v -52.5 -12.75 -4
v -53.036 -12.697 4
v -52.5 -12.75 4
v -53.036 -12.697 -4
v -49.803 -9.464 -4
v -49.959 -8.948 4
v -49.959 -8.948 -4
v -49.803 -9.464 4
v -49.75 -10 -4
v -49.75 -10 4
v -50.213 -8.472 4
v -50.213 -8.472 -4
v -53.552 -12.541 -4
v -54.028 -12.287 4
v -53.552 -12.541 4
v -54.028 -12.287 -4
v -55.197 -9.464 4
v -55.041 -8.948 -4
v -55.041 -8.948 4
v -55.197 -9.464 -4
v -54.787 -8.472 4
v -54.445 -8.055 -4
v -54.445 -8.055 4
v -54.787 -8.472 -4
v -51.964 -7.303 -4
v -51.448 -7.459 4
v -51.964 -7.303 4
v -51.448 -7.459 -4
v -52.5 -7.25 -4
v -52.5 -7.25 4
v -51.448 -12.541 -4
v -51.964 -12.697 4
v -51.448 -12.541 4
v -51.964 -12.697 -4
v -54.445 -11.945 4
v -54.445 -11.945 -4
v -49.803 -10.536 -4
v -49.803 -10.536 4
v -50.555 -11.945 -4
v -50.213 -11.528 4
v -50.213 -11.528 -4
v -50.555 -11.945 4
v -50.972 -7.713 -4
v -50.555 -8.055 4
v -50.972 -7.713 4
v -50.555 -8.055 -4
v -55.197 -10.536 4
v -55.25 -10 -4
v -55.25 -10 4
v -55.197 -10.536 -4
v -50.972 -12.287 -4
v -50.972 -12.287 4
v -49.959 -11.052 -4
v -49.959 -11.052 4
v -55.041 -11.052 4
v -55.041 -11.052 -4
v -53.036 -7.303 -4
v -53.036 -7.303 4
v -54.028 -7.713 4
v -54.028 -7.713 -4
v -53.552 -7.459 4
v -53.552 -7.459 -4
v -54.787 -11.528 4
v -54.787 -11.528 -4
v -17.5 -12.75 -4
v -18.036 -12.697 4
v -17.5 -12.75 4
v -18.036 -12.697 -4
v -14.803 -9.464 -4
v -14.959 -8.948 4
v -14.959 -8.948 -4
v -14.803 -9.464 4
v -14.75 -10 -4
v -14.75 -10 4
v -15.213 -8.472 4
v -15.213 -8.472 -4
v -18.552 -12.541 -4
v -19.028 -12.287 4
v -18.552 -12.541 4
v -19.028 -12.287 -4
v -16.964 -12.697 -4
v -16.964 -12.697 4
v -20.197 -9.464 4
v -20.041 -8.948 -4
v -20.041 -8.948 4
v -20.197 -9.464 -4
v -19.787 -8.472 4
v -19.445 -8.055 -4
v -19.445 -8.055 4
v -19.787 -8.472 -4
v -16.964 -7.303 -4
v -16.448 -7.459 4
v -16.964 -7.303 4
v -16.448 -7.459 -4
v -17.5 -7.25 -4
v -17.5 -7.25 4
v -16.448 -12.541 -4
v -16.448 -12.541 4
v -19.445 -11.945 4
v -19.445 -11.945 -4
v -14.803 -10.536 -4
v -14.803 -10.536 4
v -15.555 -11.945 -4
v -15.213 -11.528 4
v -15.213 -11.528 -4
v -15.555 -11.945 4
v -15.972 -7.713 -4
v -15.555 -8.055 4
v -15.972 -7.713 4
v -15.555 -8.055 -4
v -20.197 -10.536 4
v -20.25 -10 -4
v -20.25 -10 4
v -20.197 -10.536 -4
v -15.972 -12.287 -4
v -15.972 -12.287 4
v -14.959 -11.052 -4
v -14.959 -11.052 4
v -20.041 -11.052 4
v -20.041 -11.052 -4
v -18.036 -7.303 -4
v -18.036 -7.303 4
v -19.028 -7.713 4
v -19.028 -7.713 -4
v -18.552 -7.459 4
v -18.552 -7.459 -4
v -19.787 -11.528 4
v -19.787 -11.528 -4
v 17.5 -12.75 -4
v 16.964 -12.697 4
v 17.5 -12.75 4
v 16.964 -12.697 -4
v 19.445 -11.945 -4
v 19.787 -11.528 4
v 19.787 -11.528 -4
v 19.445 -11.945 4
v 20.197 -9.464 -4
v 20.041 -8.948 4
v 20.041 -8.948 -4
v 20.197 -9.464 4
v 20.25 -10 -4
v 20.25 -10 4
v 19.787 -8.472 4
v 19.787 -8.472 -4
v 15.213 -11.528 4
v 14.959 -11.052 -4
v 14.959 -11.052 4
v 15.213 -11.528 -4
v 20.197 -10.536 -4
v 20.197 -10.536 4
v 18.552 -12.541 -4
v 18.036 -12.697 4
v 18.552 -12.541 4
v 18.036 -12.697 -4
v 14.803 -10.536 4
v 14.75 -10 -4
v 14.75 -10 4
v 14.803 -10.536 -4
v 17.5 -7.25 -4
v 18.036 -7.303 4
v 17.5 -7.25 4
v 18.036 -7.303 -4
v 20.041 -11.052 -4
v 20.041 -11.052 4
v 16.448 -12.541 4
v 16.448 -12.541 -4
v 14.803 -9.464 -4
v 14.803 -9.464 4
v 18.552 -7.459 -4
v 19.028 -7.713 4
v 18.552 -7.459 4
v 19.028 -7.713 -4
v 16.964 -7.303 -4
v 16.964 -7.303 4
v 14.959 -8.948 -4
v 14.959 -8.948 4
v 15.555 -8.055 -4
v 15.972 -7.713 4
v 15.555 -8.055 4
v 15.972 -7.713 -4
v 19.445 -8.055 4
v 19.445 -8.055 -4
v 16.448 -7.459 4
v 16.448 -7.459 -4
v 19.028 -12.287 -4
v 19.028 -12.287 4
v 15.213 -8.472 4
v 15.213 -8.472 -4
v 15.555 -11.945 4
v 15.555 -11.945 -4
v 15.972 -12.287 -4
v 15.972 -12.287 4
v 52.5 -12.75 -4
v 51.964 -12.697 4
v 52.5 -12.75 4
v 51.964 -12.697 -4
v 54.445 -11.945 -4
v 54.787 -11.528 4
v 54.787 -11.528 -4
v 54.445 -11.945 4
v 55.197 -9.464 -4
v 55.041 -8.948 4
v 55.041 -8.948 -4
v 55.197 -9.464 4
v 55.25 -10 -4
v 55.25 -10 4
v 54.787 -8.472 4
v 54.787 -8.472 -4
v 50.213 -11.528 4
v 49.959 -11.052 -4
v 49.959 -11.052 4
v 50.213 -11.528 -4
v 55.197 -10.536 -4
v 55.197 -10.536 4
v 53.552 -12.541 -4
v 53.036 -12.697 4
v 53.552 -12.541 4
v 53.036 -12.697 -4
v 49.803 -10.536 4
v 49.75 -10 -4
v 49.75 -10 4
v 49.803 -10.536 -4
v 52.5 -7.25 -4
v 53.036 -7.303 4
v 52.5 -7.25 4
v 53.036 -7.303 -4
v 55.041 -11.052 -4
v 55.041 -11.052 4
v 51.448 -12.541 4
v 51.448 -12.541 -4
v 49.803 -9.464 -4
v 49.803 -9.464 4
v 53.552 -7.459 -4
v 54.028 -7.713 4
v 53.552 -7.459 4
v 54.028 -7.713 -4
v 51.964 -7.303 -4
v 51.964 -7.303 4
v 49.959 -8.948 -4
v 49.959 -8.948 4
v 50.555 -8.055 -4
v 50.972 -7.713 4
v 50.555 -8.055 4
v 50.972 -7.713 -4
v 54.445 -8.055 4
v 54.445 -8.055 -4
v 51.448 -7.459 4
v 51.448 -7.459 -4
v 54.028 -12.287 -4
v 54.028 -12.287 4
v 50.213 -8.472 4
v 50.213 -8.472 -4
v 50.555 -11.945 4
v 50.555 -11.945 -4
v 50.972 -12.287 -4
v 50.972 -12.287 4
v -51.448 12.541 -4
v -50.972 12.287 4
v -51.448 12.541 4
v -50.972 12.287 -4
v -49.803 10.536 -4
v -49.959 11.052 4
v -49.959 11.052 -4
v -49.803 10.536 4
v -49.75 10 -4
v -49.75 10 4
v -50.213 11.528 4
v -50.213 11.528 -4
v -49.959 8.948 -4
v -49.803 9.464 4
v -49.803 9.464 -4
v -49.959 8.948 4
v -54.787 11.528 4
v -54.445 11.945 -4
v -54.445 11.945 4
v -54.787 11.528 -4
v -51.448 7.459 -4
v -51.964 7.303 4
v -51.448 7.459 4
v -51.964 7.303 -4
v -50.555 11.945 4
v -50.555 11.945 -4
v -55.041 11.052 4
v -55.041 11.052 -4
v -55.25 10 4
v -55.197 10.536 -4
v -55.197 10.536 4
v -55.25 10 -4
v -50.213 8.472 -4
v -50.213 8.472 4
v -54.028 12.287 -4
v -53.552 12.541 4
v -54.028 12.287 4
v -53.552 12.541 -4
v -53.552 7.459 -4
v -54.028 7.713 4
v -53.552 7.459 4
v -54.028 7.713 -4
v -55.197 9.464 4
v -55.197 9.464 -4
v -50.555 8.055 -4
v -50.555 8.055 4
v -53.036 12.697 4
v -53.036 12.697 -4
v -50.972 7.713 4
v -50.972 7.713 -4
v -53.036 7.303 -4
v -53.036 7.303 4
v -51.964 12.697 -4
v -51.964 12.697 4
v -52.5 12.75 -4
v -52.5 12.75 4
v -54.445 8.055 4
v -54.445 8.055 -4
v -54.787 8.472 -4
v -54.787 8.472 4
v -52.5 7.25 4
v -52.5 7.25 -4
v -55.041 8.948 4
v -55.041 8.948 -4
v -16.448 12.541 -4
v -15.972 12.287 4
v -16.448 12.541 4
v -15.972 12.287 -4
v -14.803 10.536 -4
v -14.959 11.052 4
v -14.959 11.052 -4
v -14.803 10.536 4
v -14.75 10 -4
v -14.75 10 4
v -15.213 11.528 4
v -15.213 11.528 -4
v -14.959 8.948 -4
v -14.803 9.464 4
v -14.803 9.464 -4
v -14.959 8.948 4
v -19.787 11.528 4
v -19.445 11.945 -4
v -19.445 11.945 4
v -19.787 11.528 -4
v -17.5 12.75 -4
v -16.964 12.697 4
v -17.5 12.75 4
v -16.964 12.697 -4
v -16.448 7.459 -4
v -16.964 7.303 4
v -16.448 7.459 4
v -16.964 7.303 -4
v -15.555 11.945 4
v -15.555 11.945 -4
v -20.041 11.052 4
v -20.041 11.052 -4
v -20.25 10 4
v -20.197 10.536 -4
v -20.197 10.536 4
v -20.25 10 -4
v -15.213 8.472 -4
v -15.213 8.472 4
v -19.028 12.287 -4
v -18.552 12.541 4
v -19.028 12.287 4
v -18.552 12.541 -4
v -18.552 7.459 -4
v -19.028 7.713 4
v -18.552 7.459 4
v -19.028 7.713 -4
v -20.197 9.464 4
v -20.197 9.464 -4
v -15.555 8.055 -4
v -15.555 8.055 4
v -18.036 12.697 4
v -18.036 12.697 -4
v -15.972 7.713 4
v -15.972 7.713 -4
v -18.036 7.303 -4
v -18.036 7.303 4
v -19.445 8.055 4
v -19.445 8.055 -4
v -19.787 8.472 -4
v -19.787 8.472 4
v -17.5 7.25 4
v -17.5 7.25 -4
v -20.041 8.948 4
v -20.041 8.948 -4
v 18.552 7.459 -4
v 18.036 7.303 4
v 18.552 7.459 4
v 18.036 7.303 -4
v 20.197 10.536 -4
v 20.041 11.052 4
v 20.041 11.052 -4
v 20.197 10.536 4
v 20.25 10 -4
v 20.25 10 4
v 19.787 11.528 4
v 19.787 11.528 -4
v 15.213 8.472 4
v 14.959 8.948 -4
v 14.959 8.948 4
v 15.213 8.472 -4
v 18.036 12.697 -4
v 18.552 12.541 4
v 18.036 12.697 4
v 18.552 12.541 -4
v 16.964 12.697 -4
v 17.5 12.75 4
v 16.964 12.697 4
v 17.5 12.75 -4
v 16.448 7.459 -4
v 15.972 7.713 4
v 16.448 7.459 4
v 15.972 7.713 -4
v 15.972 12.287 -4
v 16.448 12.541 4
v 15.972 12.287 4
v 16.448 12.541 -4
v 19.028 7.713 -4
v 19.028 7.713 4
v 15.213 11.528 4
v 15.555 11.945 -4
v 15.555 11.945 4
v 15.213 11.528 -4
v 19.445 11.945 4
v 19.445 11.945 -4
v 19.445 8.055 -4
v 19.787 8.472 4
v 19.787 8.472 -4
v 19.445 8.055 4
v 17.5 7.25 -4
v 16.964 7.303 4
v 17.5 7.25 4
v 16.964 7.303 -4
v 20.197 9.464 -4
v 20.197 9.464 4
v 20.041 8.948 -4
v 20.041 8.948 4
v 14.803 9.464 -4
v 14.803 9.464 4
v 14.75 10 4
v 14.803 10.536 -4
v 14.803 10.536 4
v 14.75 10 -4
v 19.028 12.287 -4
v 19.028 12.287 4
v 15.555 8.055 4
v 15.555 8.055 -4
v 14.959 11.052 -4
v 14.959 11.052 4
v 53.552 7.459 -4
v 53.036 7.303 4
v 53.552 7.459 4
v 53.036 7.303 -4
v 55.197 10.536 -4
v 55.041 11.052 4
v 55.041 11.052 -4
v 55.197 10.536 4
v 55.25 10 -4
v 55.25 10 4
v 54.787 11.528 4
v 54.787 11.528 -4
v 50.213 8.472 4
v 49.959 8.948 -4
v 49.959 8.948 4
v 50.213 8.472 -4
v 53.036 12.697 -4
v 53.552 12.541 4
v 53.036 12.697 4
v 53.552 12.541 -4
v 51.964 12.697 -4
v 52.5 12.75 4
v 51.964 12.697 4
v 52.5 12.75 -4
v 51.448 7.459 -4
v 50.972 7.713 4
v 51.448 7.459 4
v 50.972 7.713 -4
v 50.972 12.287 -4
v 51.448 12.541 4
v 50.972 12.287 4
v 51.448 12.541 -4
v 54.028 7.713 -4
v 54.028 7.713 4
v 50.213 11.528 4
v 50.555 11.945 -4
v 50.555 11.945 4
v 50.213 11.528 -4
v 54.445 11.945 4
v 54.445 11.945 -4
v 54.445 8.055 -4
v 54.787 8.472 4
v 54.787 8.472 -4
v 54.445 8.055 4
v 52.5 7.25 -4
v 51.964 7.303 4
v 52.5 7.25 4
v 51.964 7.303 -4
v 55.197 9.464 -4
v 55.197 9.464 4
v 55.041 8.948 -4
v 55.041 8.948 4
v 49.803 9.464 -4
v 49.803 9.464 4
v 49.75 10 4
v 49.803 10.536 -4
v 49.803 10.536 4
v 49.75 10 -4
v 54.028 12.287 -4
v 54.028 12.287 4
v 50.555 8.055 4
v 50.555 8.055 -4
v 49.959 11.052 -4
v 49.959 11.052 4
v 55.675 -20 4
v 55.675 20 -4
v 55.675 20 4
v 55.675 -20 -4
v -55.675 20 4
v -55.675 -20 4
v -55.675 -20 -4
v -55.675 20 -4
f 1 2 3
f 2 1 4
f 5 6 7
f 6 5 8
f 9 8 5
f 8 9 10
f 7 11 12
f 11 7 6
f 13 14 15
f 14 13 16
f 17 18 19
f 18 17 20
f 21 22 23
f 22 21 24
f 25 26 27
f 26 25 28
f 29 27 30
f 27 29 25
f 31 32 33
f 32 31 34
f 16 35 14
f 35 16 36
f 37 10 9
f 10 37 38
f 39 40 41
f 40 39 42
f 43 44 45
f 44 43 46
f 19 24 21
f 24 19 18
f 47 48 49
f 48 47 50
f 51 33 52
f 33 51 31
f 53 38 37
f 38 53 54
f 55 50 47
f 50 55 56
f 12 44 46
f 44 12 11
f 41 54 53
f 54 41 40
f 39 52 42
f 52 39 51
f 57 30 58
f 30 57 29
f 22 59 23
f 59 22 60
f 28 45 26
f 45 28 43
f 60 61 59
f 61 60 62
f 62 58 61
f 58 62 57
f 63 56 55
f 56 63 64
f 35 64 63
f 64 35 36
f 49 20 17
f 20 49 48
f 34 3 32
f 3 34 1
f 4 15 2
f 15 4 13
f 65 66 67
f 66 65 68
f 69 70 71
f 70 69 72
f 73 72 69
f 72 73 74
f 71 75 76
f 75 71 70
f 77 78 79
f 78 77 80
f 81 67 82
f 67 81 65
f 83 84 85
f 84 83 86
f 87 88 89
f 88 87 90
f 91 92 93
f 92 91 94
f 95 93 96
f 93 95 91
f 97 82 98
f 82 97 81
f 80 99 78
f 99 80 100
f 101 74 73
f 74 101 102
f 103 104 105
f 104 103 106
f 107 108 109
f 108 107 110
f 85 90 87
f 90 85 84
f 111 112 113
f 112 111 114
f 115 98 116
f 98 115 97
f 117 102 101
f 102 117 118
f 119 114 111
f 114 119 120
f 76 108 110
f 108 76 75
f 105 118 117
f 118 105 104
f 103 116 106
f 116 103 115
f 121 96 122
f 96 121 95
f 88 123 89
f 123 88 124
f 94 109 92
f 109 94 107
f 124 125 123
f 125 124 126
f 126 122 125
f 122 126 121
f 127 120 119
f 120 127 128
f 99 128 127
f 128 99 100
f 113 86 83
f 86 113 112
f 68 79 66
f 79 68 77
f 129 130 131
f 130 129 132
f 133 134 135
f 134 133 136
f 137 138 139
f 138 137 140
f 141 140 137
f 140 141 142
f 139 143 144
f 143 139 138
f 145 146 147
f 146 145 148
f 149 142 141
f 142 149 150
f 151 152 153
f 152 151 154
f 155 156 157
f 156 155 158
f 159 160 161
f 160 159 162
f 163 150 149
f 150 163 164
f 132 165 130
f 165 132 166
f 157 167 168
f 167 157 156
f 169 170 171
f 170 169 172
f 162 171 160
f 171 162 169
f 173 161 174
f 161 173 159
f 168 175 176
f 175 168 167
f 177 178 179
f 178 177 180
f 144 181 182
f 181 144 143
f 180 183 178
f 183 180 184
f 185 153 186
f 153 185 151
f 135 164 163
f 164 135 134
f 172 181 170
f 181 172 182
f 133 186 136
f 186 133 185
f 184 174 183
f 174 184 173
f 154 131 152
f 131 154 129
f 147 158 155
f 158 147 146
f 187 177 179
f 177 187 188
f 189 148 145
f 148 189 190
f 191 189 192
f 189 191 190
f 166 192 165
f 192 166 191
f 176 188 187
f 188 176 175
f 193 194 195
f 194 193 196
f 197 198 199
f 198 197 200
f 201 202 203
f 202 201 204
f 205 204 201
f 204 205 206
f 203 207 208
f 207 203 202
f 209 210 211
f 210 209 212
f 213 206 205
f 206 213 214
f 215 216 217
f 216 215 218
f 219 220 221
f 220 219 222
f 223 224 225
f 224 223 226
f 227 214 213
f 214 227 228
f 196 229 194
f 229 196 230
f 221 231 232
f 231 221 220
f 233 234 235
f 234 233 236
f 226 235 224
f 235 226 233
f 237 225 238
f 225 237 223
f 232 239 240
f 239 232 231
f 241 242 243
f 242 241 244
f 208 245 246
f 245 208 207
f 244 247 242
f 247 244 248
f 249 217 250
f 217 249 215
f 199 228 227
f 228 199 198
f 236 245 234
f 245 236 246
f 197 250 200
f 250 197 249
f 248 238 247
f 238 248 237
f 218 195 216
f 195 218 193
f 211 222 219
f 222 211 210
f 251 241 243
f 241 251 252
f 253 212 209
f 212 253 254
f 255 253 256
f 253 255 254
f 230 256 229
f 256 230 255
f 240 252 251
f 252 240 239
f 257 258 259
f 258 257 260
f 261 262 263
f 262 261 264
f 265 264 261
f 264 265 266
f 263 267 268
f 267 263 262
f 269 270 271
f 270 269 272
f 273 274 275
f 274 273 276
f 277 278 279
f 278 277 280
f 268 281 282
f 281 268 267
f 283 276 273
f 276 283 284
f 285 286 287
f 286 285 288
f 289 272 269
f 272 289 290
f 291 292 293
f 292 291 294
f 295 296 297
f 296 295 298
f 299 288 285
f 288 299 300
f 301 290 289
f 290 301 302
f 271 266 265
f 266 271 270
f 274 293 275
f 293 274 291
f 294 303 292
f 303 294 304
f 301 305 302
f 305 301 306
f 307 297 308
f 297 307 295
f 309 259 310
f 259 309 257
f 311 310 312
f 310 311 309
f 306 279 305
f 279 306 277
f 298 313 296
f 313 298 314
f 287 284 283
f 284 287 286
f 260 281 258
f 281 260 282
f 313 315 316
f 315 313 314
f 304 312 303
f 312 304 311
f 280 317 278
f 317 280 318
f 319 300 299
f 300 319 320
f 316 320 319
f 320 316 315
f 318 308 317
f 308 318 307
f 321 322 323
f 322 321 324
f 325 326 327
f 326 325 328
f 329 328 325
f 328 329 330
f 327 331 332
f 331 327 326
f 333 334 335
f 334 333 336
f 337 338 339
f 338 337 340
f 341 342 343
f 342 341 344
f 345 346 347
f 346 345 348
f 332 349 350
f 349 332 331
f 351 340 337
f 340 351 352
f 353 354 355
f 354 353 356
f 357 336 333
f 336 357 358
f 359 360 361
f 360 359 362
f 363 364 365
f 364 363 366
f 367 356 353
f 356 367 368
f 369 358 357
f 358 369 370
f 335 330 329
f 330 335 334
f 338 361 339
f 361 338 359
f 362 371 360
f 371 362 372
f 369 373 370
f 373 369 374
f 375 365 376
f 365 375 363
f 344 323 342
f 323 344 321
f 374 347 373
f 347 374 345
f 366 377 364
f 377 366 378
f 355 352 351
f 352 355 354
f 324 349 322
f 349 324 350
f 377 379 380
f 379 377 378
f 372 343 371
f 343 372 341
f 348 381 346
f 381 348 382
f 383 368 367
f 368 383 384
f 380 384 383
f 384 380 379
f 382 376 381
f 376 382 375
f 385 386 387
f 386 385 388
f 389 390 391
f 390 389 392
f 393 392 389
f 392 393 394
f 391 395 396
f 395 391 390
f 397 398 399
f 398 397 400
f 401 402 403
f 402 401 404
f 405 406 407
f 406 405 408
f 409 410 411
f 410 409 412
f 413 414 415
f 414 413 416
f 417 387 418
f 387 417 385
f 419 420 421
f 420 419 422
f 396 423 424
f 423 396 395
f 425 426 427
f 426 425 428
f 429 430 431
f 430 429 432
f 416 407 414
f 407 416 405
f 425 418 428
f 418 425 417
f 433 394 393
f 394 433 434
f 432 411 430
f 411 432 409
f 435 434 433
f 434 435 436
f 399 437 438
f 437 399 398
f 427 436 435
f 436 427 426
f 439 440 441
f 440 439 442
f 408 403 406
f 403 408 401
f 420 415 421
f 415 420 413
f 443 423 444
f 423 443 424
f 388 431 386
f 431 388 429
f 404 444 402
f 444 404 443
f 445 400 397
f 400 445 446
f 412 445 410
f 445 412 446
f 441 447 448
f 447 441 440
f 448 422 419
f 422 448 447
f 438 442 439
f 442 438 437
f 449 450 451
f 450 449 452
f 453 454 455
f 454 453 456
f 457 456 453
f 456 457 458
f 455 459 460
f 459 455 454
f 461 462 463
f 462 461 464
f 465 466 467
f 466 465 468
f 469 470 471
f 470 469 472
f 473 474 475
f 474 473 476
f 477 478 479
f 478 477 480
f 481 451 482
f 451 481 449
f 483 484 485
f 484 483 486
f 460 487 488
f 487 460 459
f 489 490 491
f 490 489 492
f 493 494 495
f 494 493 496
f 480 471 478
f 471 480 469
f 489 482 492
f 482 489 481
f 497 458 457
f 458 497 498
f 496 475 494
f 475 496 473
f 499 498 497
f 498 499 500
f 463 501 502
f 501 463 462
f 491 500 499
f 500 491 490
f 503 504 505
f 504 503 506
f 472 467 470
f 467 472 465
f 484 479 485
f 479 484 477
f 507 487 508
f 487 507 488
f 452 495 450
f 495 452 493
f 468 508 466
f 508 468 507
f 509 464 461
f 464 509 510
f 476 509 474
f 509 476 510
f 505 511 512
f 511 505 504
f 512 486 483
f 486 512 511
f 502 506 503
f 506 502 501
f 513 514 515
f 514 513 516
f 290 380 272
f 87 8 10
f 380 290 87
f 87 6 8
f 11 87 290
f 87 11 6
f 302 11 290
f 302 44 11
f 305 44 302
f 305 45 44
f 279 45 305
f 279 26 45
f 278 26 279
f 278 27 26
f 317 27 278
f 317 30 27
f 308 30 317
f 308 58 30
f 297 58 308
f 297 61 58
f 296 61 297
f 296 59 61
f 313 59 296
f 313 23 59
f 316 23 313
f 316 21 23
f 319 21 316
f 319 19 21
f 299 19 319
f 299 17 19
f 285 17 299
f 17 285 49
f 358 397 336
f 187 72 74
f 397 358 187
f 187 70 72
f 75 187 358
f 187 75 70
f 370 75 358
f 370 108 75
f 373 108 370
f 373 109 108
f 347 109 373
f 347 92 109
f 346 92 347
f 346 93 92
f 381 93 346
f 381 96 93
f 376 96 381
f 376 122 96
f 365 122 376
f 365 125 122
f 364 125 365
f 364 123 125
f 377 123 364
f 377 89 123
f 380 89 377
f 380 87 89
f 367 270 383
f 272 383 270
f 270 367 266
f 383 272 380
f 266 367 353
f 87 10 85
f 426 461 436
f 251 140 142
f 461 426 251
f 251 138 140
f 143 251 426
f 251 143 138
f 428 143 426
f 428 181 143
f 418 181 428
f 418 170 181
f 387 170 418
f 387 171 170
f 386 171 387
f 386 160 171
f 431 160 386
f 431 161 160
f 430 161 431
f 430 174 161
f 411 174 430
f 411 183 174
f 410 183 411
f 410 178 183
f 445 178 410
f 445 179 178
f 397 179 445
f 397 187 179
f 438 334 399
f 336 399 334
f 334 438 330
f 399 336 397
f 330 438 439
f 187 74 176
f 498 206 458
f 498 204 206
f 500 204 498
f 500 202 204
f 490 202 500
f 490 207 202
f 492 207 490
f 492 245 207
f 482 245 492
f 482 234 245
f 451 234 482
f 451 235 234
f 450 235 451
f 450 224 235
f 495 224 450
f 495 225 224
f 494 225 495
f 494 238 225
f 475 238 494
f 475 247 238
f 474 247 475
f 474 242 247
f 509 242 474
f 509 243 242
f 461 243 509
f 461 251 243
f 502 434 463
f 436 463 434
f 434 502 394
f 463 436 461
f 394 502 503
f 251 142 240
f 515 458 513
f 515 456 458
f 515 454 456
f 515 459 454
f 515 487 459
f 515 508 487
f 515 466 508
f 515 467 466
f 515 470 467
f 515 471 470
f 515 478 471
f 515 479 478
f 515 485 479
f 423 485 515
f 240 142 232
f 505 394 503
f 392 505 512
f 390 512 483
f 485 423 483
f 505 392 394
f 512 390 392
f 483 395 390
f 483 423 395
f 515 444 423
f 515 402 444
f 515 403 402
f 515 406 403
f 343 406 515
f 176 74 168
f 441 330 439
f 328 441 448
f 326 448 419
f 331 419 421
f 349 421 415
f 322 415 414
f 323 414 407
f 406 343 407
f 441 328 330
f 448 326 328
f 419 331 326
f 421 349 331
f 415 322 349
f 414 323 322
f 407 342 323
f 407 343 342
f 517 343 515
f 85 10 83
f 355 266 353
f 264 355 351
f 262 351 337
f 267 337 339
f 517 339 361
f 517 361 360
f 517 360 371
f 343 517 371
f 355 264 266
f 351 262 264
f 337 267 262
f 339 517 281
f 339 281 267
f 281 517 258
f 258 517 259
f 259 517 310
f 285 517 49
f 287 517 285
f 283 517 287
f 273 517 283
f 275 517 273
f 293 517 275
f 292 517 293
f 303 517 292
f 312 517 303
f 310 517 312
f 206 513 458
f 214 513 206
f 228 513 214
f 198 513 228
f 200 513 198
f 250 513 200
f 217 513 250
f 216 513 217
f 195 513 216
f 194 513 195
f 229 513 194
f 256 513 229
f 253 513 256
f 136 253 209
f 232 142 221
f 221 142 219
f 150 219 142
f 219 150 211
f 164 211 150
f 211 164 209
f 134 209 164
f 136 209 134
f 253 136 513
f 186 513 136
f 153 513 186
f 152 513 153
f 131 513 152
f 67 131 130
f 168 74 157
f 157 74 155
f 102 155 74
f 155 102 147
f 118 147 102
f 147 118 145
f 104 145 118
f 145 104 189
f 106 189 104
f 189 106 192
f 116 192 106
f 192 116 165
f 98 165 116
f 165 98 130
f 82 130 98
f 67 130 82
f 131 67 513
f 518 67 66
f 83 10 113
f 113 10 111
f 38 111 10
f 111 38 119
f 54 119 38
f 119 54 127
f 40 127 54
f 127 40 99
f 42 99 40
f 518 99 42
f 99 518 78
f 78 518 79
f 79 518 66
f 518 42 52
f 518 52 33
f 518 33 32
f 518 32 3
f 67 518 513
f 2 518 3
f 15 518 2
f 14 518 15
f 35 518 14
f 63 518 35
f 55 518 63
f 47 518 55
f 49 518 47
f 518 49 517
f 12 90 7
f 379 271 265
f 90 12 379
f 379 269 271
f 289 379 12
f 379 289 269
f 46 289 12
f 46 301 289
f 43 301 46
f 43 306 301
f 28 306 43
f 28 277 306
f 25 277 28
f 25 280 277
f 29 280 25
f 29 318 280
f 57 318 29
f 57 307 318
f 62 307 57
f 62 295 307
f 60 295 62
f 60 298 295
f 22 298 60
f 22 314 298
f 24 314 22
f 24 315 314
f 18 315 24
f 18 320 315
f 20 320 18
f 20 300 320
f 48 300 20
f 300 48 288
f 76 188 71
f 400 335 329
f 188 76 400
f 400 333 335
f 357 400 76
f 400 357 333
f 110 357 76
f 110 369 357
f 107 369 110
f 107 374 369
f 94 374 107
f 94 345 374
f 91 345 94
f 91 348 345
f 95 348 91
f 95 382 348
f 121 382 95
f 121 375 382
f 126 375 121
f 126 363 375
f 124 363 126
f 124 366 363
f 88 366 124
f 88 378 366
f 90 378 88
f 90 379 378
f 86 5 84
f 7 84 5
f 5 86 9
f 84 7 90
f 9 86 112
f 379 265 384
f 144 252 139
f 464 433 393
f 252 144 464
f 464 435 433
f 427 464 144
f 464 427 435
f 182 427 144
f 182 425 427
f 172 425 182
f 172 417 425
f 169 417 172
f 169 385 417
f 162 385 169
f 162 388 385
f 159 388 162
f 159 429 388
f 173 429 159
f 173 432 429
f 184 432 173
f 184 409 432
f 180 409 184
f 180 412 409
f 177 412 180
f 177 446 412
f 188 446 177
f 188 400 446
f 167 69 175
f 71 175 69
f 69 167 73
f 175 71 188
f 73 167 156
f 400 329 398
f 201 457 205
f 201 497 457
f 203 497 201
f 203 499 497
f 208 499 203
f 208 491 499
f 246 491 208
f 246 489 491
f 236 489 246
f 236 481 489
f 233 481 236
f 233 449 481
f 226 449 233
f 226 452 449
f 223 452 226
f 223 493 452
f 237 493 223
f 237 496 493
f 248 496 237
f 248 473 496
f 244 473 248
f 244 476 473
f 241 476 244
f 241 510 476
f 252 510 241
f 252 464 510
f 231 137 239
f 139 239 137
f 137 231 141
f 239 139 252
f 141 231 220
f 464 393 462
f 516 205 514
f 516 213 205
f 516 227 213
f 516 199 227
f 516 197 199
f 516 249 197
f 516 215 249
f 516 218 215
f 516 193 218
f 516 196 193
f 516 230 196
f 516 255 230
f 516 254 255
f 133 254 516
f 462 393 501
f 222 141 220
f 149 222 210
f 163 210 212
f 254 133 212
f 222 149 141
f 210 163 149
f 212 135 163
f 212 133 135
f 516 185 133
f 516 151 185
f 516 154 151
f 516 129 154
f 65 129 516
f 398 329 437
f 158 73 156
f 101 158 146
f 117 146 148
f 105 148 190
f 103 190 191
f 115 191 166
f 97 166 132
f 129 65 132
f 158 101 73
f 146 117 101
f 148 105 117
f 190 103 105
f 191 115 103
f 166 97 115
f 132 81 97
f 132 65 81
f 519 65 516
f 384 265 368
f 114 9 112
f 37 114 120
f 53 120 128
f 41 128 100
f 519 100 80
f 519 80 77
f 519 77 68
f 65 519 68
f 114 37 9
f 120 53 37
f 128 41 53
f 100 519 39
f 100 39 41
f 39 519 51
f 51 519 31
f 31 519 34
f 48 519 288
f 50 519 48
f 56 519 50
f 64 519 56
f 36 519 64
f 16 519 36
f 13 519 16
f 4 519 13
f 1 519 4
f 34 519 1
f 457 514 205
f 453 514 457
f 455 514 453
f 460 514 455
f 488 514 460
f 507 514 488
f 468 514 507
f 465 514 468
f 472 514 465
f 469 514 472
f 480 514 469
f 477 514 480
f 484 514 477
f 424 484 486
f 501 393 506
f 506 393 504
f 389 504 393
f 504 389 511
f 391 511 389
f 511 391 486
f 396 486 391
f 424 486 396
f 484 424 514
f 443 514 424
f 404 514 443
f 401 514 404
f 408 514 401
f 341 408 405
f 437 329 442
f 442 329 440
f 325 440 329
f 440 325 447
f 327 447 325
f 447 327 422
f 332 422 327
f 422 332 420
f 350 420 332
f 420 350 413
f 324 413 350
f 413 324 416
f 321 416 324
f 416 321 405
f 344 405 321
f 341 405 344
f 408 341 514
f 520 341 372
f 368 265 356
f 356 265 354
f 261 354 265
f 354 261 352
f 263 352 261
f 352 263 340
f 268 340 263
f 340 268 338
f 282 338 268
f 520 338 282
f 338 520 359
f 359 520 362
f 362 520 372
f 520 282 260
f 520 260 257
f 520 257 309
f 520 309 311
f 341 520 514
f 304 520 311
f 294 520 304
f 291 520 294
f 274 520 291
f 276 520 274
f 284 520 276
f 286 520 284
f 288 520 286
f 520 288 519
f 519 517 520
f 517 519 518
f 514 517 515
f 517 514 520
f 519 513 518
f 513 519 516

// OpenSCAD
$fn = 32;

// ----------------------------------------------------------------------
// Hole bar, 4 x Ø5.5
// tworows layout, 3.175 mm edge offset
// ----------------------------------------------------------------------

// --- parameters (mm) ---
bar_w = 40;       // bar width (Y)
bar_t = 8;        // bar thickness (Z)
holes = 4;        // holes per row
hole_d = 5.5;     // hole diameter
edge = 3.175;     // offset from the bar end to the first hole
pitch = 35;       // pitch between neighbouring holes
row_offset = 20;  // distance between the two rows

// --- derived feature positions (mm) ---
span = (holes - 1) * pitch;   // = 105   distance between the end holes
bar_l = span + 2 * edge;      // = 111.35   overall bar length
start_x = -bar_l / 2 + edge;  // = -52.5   X of the first hole
feature_centers = [
  [start_x + 0 * pitch, -row_offset / 2],
  [start_x + 1 * pitch, -row_offset / 2],
  [start_x + 2 * pitch, -row_offset / 2],
  [start_x + 3 * pitch, -row_offset / 2]
];   // hole centres of the first row
row2_centers = [
  [start_x + 0 * pitch, row_offset / 2],
  [start_x + 1 * pitch, row_offset / 2],
  [start_x + 2 * pitch, row_offset / 2],
  [start_x + 3 * pitch, row_offset / 2]
];   // hole centres of the second row

// bar with two rows of holes, both read from their own centre arrays
difference() {
  translate([-bar_l / 2, -bar_w / 2, -bar_t / 2]) cube([bar_l, bar_w, bar_t]);
  for (centre = feature_centers)
    translate([centre[0], centre[1], 0])
      cylinder(d = hole_d, h = bar_t + 2, center = true);
  for (centre = row2_centers)
    translate([centre[0], centre[1], 0])
      cylinder(d = hole_d, h = bar_t + 2, center = true);
}
